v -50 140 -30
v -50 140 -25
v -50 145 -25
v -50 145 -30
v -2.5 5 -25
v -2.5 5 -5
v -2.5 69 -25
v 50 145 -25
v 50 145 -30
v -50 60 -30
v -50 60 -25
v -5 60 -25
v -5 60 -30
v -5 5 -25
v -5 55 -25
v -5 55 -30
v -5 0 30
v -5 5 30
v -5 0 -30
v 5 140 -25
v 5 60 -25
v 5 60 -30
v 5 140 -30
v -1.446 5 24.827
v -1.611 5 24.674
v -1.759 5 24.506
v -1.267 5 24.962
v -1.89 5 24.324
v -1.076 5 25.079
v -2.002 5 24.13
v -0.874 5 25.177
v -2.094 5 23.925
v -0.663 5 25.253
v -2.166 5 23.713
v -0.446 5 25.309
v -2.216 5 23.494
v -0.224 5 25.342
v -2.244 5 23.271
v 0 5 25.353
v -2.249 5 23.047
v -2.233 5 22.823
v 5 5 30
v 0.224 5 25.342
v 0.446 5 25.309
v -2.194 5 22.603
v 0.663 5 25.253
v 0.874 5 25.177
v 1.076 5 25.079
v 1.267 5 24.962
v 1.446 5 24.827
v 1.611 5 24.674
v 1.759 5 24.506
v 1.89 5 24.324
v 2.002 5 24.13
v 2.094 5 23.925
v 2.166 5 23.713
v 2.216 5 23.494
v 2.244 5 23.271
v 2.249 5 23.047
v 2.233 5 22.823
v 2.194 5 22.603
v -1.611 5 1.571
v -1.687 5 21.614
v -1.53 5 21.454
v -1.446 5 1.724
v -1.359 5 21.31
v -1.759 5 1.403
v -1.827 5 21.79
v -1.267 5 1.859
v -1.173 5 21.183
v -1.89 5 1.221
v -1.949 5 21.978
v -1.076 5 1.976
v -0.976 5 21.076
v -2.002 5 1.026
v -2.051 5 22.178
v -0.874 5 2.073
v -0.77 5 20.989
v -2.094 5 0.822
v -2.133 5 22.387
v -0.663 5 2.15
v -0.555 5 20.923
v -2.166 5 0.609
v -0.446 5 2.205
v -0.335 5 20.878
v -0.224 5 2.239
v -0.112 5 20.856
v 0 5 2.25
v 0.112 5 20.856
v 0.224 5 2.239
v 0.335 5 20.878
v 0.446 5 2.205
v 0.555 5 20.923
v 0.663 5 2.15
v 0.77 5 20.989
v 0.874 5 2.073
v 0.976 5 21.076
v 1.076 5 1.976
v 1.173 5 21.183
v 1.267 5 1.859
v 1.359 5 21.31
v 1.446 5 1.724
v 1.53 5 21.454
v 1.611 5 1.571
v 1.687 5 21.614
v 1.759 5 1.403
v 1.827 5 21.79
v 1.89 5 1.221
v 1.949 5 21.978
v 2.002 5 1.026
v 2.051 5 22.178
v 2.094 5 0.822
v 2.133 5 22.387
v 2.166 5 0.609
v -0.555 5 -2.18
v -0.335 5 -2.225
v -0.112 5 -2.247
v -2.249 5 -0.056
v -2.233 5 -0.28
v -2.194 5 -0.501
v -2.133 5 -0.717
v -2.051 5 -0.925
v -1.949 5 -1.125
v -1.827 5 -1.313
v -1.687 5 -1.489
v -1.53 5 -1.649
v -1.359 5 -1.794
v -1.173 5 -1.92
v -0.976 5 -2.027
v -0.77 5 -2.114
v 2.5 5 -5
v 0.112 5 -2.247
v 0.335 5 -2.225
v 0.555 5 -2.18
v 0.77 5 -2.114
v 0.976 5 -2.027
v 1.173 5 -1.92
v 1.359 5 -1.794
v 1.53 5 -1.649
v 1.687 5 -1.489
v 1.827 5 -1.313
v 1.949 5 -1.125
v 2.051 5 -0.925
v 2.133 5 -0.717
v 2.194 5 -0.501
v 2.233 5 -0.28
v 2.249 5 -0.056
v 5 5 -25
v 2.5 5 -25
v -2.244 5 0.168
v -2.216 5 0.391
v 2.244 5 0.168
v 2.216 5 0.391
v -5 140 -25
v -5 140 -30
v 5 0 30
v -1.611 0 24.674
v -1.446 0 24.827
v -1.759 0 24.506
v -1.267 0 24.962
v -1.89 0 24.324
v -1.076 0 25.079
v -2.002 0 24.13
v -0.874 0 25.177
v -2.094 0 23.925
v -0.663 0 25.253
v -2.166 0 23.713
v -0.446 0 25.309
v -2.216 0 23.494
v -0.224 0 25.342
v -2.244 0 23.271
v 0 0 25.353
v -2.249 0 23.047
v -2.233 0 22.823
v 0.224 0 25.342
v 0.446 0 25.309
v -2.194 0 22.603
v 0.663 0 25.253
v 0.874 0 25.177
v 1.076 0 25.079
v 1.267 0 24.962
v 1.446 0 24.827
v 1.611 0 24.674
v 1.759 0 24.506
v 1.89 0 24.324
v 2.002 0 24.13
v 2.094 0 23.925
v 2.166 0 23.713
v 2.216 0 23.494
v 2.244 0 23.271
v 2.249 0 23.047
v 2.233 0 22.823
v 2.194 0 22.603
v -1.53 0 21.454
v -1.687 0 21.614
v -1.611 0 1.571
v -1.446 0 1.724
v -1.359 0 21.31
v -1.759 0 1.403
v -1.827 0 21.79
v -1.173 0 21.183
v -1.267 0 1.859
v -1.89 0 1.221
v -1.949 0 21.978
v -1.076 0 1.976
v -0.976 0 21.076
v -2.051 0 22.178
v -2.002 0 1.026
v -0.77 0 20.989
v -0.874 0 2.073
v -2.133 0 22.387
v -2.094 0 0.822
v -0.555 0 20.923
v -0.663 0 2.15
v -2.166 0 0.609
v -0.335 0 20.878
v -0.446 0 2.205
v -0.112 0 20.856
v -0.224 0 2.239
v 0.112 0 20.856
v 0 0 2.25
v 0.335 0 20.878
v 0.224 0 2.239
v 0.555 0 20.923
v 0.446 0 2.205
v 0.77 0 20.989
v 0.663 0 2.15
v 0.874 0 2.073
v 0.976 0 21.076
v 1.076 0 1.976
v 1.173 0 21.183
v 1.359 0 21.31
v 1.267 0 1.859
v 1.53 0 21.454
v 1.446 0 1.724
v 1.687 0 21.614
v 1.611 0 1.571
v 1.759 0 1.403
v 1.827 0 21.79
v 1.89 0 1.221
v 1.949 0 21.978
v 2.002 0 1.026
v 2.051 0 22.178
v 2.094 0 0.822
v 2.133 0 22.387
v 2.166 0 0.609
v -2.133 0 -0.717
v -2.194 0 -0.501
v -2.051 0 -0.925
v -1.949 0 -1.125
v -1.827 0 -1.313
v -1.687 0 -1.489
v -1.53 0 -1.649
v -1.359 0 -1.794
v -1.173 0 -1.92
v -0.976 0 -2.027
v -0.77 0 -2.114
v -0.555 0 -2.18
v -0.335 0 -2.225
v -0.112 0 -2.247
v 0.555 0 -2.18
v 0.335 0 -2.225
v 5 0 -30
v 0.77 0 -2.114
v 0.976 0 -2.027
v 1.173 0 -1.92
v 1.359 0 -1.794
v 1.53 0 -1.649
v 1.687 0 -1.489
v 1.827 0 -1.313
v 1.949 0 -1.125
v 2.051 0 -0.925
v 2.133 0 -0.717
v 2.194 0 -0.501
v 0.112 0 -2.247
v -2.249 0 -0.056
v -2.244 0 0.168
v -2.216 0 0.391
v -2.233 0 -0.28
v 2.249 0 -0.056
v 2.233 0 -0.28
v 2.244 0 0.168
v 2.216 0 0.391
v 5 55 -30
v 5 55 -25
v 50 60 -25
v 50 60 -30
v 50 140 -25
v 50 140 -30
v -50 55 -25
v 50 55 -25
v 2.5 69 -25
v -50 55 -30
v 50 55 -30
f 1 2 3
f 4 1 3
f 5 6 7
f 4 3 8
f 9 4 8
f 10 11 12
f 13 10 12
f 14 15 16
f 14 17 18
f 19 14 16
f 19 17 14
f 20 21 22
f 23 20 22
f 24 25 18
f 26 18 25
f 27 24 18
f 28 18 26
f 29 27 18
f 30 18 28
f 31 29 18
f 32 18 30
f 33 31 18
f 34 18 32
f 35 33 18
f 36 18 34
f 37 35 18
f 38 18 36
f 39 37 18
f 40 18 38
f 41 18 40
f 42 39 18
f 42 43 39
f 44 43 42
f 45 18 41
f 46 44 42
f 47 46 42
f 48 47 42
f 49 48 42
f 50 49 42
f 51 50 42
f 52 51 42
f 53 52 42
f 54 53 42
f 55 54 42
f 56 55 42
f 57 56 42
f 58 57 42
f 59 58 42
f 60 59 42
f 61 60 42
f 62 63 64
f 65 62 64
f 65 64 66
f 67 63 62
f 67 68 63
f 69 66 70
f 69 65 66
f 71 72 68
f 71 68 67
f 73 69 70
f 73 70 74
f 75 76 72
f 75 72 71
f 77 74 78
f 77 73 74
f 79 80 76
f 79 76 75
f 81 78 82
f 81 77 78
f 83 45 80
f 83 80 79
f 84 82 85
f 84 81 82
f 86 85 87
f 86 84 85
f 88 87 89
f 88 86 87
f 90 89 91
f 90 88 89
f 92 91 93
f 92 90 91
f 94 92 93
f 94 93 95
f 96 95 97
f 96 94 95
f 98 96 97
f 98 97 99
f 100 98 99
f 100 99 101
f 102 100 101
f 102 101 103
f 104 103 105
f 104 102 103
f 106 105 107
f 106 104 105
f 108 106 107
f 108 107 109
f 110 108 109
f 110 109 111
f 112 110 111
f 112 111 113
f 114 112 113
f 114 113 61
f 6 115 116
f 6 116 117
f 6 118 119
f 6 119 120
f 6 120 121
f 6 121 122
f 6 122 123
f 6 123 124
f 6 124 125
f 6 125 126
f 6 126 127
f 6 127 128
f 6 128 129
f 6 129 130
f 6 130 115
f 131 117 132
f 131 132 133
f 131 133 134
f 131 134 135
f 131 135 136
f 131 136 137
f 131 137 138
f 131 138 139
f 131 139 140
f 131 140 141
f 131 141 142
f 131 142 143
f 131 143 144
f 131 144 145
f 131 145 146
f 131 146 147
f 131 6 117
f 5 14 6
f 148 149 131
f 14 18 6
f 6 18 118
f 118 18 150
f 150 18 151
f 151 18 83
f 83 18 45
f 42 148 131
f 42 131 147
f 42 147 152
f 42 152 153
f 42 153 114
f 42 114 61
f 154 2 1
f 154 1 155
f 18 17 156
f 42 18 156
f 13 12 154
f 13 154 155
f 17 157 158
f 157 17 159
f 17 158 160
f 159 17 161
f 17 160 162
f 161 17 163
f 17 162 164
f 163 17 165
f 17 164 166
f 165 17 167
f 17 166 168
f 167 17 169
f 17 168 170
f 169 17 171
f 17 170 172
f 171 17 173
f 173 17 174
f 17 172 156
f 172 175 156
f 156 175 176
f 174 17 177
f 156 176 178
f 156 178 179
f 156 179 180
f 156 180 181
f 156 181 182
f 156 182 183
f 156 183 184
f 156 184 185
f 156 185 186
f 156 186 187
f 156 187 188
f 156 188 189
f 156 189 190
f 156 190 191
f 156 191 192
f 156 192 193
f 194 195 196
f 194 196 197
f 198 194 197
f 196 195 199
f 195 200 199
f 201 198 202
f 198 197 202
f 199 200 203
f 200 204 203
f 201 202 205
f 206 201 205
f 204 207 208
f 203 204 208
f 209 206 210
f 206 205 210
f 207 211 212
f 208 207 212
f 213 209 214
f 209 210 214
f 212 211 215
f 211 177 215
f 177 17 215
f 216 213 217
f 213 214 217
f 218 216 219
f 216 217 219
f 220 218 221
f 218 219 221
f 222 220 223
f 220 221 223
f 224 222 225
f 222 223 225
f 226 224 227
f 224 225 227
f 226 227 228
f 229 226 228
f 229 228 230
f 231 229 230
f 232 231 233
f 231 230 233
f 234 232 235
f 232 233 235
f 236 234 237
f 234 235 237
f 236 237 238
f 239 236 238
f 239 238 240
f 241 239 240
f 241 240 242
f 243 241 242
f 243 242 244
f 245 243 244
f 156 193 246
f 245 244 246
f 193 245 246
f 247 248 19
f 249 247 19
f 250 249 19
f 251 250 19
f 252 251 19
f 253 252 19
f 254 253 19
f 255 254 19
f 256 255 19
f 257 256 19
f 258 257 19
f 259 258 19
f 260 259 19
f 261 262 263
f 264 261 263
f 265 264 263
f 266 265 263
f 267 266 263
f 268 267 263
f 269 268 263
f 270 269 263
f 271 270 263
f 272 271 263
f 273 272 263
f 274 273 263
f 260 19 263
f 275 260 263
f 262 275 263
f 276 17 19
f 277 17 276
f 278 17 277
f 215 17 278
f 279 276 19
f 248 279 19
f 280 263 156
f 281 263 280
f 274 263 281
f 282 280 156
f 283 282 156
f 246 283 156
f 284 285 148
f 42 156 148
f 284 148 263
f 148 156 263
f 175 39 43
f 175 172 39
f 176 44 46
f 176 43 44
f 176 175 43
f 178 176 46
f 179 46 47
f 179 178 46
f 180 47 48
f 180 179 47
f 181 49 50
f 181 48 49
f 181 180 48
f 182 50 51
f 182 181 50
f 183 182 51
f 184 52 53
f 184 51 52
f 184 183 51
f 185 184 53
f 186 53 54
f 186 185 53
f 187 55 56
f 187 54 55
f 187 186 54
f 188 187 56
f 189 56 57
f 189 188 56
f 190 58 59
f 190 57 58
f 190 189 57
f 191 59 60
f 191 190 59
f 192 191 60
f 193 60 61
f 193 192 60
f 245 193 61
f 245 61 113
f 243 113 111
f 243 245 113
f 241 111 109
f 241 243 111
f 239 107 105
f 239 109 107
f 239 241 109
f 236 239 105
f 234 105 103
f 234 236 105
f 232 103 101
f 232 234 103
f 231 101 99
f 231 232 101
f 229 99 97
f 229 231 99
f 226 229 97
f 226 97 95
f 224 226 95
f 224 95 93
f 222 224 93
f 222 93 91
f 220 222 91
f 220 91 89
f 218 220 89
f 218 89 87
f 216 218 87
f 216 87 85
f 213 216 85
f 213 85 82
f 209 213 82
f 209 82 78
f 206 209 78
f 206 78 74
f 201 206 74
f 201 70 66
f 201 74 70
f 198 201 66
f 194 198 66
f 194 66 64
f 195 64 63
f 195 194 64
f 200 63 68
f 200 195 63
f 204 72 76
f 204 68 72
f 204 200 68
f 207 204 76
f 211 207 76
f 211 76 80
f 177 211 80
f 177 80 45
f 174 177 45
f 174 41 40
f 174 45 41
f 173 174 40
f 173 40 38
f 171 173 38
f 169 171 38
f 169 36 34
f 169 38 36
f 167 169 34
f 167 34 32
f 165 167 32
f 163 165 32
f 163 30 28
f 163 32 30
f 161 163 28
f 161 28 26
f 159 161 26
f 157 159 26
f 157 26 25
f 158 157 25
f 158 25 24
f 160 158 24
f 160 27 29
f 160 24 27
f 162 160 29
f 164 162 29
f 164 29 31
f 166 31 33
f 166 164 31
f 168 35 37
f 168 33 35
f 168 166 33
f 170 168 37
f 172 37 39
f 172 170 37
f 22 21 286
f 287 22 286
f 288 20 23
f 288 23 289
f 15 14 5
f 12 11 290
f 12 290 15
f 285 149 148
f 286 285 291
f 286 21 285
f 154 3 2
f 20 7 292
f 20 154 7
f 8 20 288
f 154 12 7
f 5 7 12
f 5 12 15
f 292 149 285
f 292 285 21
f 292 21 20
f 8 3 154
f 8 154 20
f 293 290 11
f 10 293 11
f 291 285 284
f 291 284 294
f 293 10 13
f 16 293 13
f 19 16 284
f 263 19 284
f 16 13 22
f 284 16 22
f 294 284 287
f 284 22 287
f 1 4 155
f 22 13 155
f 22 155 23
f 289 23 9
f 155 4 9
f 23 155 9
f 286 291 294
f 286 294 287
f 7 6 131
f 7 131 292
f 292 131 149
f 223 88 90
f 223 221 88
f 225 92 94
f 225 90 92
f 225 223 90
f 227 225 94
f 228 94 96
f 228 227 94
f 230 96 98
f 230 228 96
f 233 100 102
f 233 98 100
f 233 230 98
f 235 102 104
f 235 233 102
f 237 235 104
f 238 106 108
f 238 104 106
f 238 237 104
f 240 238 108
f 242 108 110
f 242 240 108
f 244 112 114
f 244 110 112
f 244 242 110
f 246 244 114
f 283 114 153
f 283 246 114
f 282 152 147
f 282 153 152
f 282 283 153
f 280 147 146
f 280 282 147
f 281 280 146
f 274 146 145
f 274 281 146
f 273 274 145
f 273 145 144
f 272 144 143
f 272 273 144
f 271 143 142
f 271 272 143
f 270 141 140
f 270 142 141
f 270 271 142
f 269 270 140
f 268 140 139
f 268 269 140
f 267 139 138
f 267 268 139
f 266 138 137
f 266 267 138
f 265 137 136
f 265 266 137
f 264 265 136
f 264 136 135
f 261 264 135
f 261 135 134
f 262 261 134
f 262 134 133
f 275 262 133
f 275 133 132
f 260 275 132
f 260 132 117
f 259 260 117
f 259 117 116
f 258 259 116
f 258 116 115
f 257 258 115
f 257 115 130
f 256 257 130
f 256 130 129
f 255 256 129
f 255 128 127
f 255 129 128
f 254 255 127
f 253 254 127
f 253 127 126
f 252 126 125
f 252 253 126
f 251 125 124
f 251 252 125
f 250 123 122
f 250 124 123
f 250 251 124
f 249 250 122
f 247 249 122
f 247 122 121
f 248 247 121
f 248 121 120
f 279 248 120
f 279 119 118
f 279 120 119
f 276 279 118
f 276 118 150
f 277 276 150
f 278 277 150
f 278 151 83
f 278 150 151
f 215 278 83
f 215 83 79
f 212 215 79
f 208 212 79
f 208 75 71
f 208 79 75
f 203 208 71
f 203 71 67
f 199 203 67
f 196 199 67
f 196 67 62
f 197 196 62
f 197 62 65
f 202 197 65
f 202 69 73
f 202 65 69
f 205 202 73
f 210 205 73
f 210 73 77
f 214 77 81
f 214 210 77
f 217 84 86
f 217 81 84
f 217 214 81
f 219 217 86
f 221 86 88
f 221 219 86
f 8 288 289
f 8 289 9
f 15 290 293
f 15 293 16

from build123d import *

# Parameters (mm, degrees)
SKETCH1_W               = 10
SKETCH1_H               = 60
BOSS_EXTRUDE1_DEPTH     = 5
SKETCH2_W               = 10
SKETCH2_H               = 5
BOSS_EXTRUDE2_DEPTH     = 140
RIB1_REACH              = 150.155
SKETCH3_WALL_W          = 365.362866258
SKETCH3_WALL_H          = 5
SKETCH4_W               = 100
SKETCH4_H               = 5
BOSS_EXTRUDE3_DEPTH     = 5
CUT_EXTRUDE1_DEPTH      = 152.657508881
CUT_EXTRUDE1_DEPTH_BACK = 152.657508881
SKETCH6_R               = 2.25


with BuildPart() as part:
    # Sketch1 → Boss-Extrude1 (new body)
    with BuildSketch(Plane(origin=(0, 0, 0), x_dir=(1, 0, 0), z_dir=(0, 1, 0))):
        Rectangle(SKETCH1_W, SKETCH1_H)
    extrude(amount=BOSS_EXTRUDE1_DEPTH)

    # Sketch2 → Boss-Extrude2 (add)
    with BuildSketch(Plane(origin=(0, 5, 0), x_dir=(1, 0, 0), z_dir=(0, 1, 0))):
        with Locations((0, 27.5)):
            Rectangle(SKETCH2_W, SKETCH2_H)
    extrude(amount=BOSS_EXTRUDE2_DEPTH)

    # Sketch3 wall → Rib1 (add, up to next)
    with BuildSketch(Plane(origin=(0, 37, -15), x_dir=(0, 0.954479978035, -0.298274993136), z_dir=(0, 0.298274993136, 0.954479978035)), mode=Mode.PRIVATE) as rib1_sk1:
        Rectangle(SKETCH3_WALL_W, SKETCH3_WALL_H)
    rib1_tool1 = extrude(rib1_sk1.sketch, amount=-RIB1_REACH, mode=Mode.PRIVATE) - part.part
    add(rib1_tool1.solids().sort_by_distance((0, 37, -15))[0])

    # Sketch4 → Boss-Extrude3 (add)
    with BuildSketch(Plane.XY.offset(-25)):
        with Locations((0, 142.5)):
            Rectangle(SKETCH4_W, SKETCH4_H)
        with Locations((0, 57.5)):
            Rectangle(SKETCH4_W, SKETCH4_H)
    extrude(amount=-BOSS_EXTRUDE3_DEPTH)

    # Sketch6 → Cut-Extrude1 (cut, two sides: drawn at the far end of the back side and taken through both)
    with BuildSketch(Plane(origin=(0, 5, 0), x_dir=(1, 0, 0), z_dir=(0, 1, 0)).offset(-CUT_EXTRUDE1_DEPTH_BACK)):
        with Locations(Location((0, 0, 0), (0, 0, 270))):
            Circle(SKETCH6_R)
        with Locations(Location((0, -23.103193392, 0), (0, 0, 270))):
            Circle(SKETCH6_R)
    extrude(amount=CUT_EXTRUDE1_DEPTH + CUT_EXTRUDE1_DEPTH_BACK, mode=Mode.SUBTRACT)


solid = part.part
